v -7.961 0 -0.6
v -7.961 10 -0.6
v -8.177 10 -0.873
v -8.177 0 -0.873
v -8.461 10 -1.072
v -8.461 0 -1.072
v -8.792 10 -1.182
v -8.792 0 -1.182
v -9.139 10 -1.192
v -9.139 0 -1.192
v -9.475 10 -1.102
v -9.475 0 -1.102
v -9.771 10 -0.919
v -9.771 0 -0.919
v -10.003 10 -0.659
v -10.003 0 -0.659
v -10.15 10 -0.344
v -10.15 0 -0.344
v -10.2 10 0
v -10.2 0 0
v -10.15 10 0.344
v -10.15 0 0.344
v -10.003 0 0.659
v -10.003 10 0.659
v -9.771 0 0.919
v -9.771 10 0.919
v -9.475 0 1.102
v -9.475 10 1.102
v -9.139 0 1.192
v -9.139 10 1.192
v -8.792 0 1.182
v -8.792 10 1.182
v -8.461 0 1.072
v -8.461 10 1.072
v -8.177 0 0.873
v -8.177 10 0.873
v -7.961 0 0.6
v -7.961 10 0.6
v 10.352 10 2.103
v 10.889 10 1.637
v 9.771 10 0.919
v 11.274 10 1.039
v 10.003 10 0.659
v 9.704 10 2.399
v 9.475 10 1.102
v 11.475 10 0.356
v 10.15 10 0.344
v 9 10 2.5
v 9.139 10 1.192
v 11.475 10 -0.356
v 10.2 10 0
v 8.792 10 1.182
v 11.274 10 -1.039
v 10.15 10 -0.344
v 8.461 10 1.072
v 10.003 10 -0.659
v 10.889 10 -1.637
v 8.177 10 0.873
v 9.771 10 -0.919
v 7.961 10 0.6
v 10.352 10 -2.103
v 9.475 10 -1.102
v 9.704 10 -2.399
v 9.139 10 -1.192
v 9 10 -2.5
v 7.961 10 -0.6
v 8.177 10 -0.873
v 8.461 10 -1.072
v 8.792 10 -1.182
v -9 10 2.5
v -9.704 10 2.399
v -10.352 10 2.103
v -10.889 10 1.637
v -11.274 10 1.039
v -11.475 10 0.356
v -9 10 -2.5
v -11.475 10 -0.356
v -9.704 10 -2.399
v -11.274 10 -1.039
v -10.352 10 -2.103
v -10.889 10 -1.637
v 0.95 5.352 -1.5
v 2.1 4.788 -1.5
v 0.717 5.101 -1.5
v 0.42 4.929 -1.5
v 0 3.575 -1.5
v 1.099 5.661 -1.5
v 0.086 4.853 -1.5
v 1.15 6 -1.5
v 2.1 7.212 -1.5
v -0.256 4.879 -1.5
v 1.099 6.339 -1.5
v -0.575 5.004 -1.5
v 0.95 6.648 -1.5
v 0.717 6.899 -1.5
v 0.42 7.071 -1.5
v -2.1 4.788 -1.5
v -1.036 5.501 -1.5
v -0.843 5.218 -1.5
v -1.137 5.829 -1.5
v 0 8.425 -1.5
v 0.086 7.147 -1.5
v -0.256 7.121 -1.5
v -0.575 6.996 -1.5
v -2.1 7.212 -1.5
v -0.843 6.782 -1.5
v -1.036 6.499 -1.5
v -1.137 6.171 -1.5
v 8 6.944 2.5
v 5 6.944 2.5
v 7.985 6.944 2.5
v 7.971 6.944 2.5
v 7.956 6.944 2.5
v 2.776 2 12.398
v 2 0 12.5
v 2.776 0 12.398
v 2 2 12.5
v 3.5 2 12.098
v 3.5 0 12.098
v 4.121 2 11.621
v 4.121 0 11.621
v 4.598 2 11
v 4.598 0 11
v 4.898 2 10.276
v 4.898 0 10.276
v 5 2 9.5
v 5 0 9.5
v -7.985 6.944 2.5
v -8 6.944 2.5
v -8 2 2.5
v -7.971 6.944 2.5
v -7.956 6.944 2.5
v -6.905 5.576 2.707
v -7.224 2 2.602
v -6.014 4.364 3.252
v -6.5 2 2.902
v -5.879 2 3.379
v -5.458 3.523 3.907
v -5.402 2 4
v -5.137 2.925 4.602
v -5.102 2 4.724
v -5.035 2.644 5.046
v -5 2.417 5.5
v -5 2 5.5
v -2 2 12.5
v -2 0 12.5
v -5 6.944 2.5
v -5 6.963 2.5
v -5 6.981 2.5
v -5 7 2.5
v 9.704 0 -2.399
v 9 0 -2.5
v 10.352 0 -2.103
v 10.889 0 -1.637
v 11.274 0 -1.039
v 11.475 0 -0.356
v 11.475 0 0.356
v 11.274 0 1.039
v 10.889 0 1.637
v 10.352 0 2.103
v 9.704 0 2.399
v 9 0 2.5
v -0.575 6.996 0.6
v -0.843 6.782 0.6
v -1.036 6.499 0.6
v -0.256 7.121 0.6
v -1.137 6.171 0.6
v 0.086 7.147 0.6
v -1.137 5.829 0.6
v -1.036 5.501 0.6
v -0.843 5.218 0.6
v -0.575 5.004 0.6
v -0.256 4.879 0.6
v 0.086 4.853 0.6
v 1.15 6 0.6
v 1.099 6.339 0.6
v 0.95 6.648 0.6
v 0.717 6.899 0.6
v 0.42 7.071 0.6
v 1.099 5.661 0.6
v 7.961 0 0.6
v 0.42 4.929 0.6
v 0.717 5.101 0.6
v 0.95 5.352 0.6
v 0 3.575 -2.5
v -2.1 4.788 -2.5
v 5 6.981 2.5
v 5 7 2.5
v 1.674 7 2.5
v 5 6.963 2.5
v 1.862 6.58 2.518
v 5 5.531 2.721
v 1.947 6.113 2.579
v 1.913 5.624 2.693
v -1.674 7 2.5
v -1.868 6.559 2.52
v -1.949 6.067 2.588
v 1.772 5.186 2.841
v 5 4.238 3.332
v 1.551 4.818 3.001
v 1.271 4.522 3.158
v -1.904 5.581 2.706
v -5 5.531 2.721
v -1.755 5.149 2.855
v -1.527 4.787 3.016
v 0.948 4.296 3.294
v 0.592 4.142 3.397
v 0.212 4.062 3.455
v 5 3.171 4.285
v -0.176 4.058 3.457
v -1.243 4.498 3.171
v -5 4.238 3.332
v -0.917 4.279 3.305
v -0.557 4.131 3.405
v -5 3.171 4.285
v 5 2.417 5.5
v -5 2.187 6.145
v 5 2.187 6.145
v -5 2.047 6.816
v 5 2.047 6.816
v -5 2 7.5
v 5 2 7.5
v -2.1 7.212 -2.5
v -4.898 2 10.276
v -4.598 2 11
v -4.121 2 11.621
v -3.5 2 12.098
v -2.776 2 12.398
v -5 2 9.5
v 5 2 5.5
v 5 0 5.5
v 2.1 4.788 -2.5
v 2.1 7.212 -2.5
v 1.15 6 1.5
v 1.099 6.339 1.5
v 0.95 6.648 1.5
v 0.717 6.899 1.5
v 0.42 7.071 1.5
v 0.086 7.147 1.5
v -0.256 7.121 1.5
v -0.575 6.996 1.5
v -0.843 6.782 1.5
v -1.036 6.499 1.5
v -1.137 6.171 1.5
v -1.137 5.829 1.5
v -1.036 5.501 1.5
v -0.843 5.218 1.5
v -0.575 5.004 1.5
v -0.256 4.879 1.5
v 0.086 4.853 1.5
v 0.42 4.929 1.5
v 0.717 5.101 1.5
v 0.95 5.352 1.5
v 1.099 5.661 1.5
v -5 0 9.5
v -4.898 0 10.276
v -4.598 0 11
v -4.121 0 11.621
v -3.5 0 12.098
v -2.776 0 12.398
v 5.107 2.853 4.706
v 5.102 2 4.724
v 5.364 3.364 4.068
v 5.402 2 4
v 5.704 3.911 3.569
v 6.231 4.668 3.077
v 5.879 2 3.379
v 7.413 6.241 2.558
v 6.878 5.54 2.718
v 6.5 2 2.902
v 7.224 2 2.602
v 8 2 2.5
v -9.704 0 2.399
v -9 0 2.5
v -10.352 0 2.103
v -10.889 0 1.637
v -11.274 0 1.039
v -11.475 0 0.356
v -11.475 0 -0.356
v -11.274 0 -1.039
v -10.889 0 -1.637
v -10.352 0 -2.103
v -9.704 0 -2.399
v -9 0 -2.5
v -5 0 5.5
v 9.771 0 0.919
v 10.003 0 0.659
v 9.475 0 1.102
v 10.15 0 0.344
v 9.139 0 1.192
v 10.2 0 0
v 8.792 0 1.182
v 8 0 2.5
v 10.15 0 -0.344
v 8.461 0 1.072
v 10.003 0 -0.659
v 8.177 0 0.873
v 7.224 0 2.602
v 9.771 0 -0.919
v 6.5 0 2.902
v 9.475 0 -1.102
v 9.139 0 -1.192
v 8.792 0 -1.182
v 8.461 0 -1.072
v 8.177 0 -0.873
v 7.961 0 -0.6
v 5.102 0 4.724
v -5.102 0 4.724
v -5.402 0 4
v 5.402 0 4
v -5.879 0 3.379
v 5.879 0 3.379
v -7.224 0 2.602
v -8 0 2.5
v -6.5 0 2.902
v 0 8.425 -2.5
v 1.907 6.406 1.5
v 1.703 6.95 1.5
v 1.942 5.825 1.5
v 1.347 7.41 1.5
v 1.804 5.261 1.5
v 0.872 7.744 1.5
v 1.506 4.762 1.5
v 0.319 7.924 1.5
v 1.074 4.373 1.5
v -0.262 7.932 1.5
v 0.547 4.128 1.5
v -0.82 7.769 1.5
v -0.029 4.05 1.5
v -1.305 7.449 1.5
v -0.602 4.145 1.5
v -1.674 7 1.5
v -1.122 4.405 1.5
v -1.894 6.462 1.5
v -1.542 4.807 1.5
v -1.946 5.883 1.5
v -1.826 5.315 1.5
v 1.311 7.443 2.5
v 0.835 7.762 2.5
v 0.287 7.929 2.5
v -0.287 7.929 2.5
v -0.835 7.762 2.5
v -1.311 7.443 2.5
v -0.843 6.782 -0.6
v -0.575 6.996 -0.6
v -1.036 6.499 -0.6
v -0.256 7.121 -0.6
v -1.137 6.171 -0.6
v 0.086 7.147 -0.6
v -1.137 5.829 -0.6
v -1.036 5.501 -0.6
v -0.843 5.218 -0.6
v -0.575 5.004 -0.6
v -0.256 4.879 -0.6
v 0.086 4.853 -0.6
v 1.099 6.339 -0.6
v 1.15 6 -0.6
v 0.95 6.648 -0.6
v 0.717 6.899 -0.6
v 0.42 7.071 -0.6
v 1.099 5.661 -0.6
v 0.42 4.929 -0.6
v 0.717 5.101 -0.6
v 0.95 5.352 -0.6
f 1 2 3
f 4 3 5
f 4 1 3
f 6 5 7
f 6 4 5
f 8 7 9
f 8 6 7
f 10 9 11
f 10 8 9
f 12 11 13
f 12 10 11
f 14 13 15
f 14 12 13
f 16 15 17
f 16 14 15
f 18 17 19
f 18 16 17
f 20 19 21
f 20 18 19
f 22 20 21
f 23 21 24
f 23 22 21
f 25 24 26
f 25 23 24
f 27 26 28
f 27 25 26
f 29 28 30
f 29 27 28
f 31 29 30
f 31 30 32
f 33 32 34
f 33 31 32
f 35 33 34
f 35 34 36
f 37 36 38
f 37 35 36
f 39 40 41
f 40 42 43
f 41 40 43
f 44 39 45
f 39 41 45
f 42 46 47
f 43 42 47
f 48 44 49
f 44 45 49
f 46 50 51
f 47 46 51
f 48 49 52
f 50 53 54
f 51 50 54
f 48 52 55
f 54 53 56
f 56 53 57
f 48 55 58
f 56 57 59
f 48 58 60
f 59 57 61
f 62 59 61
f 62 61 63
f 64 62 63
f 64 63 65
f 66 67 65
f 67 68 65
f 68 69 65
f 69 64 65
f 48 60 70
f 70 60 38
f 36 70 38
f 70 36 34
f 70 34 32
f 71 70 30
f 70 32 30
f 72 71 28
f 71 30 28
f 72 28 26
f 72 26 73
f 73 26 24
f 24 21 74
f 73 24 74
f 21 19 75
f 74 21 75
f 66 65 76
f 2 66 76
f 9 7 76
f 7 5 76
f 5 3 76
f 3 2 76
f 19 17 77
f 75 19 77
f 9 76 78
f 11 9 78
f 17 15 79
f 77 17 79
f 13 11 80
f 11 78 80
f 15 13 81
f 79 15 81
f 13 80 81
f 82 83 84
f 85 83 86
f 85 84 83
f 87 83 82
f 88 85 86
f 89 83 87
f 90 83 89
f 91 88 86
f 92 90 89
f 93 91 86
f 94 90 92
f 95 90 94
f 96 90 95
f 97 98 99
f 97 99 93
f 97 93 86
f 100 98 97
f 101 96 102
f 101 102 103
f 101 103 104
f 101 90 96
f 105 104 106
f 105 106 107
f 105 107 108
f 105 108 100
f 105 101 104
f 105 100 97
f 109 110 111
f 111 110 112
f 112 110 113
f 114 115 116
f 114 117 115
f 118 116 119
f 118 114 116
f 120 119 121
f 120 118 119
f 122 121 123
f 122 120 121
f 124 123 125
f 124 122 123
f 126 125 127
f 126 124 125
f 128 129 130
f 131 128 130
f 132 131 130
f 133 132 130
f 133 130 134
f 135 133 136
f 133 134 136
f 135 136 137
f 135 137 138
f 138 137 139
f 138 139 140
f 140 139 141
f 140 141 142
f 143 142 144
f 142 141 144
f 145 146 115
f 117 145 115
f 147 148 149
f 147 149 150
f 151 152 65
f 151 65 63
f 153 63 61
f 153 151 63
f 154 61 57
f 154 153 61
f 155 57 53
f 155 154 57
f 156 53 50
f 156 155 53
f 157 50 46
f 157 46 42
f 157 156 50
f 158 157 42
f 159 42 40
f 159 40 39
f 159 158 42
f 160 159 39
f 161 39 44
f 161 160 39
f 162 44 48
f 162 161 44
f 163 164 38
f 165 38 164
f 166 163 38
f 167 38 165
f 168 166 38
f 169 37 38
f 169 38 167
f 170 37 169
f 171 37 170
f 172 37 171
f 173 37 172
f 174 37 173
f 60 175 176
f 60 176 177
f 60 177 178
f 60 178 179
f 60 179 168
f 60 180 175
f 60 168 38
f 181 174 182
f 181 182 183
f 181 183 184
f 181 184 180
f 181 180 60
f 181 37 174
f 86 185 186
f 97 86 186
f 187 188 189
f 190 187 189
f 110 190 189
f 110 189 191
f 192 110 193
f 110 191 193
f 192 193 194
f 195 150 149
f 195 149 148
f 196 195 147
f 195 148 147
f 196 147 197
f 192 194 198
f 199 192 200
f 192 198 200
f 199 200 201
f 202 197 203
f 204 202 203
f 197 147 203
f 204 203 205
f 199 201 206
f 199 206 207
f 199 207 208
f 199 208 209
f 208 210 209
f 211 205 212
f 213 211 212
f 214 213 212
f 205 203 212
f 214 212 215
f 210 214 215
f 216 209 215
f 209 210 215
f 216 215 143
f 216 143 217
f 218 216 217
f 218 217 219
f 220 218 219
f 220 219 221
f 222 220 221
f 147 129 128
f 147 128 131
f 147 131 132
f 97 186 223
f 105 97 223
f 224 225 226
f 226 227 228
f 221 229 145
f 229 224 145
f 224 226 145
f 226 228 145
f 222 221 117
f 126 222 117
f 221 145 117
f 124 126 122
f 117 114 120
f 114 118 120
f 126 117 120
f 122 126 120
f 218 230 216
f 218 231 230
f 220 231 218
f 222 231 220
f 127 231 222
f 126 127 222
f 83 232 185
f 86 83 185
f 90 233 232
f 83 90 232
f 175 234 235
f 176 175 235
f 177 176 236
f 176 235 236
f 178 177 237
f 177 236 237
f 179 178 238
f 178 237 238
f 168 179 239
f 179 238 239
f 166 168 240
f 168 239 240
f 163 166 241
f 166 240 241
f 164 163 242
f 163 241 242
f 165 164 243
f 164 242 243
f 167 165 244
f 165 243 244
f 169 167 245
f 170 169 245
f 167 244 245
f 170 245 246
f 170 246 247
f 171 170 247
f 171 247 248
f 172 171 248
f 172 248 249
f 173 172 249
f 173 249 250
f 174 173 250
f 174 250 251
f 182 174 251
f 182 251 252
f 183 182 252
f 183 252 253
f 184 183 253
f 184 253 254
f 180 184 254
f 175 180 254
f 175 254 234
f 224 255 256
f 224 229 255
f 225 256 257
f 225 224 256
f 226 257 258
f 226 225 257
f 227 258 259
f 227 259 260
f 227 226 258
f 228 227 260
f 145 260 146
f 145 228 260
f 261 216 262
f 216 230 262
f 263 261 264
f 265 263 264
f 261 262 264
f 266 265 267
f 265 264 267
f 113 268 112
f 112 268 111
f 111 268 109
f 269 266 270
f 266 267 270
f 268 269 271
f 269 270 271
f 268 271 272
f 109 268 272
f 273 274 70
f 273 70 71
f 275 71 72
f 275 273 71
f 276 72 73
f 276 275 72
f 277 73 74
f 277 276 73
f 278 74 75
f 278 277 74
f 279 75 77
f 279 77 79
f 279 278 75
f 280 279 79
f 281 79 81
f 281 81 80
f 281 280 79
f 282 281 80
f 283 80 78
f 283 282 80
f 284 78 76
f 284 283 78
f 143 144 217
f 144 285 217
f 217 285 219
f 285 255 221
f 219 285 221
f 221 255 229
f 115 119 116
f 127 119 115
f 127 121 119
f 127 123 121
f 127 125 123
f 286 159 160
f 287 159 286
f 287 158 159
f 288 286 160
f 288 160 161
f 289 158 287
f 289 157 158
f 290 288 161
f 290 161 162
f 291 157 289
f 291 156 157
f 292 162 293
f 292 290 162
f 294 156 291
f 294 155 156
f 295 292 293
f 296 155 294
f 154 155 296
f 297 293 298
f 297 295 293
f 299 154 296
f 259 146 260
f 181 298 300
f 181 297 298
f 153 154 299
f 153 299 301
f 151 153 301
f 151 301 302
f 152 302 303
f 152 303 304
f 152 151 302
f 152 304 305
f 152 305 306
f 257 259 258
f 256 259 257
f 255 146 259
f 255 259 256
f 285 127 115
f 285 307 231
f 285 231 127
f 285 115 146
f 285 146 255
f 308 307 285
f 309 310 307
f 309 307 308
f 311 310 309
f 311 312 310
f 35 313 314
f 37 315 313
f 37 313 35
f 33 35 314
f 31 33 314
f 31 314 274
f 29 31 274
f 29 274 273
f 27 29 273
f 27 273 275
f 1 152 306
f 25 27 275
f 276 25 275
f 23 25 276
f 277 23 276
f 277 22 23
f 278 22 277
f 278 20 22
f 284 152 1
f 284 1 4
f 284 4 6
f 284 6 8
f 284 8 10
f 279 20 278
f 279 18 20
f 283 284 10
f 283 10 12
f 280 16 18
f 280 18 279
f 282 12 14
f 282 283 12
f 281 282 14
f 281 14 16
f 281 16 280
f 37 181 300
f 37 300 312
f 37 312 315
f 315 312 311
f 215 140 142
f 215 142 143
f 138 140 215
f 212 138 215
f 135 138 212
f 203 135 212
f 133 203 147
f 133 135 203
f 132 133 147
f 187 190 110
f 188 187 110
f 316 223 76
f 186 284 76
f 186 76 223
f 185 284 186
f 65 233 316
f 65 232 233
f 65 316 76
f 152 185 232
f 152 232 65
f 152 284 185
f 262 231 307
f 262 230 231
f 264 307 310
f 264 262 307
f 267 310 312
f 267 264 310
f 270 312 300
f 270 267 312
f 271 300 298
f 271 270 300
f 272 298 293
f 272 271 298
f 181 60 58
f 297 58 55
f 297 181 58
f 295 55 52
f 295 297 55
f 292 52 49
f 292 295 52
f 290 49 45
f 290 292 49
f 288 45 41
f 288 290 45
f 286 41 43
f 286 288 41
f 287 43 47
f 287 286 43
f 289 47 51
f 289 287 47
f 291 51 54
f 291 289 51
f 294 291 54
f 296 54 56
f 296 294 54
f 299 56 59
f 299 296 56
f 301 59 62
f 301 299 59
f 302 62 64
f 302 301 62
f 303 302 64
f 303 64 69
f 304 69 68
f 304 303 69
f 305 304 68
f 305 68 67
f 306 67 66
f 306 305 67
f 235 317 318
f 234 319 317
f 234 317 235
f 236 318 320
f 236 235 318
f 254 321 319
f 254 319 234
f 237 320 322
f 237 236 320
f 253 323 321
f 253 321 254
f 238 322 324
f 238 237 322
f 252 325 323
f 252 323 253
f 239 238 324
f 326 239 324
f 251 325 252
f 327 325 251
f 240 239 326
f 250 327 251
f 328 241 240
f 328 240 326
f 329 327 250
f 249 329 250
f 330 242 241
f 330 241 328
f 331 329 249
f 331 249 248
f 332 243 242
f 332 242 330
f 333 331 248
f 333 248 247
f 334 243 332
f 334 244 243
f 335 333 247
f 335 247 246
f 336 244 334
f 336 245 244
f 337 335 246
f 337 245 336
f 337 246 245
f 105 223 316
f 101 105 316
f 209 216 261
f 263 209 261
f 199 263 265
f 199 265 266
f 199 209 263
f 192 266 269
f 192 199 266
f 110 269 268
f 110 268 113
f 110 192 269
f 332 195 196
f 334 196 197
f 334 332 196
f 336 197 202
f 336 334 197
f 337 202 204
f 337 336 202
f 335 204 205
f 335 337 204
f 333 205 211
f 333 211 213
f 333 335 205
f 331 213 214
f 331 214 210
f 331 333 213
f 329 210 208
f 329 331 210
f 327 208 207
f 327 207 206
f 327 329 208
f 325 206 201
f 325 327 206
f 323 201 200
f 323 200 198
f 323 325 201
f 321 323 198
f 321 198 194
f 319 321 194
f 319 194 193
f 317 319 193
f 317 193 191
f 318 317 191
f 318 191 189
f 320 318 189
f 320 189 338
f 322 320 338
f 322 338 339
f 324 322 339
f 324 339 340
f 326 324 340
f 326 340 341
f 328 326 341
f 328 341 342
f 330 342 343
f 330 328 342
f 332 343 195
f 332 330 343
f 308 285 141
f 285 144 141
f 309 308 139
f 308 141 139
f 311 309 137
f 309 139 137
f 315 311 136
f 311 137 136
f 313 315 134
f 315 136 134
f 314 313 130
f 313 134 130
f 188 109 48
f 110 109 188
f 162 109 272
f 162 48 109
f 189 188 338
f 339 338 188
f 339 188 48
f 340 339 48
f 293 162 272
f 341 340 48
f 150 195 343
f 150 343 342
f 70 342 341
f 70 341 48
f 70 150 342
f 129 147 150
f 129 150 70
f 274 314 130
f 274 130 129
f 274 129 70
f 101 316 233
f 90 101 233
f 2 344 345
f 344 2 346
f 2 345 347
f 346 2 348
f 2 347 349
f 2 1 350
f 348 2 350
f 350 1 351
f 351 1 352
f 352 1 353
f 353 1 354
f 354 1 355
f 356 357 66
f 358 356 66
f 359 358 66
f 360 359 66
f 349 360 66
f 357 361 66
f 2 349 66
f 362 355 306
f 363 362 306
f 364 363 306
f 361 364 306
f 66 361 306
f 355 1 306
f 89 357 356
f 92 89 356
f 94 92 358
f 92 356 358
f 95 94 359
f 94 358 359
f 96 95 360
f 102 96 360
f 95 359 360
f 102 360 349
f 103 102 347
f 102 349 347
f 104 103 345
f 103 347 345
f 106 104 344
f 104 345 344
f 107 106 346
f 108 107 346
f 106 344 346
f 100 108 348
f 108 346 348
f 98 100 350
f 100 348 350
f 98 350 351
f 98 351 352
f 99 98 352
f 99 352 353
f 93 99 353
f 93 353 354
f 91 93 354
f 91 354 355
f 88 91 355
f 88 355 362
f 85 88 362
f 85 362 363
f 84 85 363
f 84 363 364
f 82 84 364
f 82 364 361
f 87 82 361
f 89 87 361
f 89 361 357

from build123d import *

# Parameters (mm, degrees)
SKETCH_1_R               = 1.2
EXTRUDE_1_DEPTH          = 10
SKETCH_3_W               = 10
SKETCH_3_H               = 15
EXTRUDE_2_DEPTH          = 2
FILLET_2_R               = 3
FILLET_START             = -5
FILLET_3_DEPTH           = 10
FILLET_START_2           = 2
FILLET_3_2_DEPTH         = 4.9438
FILLET_START_3           = -9
FILLET_3_3_DEPTH         = 17
SKETCH_4_W               = 15.92154
SKETCH_4_H               = 1.2
CUT_EXTRUDE_2_DEPTH      = 20.710403
CUT_EXTRUDE_4_DEPTH      = 19.227726
CUT_EXTRUDE_4_DEPTH_BACK = 1
SKETCH_6_R               = 1.95
SKETCH_7_R               = 1.15
CUT_EXTRUDE_5_DEPTH      = 19.794946
CUT_EXTRUDE_6_DEPTH      = 1


with BuildPart() as part:
    # 草图1 → 凸台-拉伸1 (new body)
    with BuildSketch(Plane(origin=(0, 0, 0), x_dir=(1, 0, 0), z_dir=(0, 1, 0))):
        with BuildLine():
            Line((-9, 2.5), (9, 2.5))
            ThreePointArc((9, 2.5), (11.5, 0), (9, -2.5))
            Line((9, -2.5), (-9, -2.5))
            ThreePointArc((-9, -2.5), (-11.5, 0), (-9, 2.5))
        make_face()
        with Locations(Location((9, 0, 0), (0, 0, 270))):
            Circle(SKETCH_1_R, mode=Mode.SUBTRACT)
        with Locations(Location((-9, 0, 0), (0, 0, 90))):
            Circle(SKETCH_1_R, mode=Mode.SUBTRACT)
    extrude(amount=EXTRUDE_1_DEPTH)

    # 草图3 → 凸台-拉伸2 (add)
    with BuildSketch(Plane.XZ):
        with Locations((0, 5)):
            Rectangle(SKETCH_3_W, SKETCH_3_H)
    extrude(amount=-EXTRUDE_2_DEPTH)

    # 圆角2
    fillet_2_edges = [part.edges().sort_by_distance(p)[0] for p in [
        (5, 1, 12.5),
        (5, 1, 2.5),
        (-5, 1, 2.5),
        (-5, 1, 12.5),
    ]]
    fillet(fillet_2_edges, radius=FILLET_2_R)

    # 圆角3: read off the stored shape, not the designer's step
    # 圆角3 outline → 圆角3 (add)
    with BuildSketch(Plane.YZ.offset(FILLET_START)):
        with BuildLine():
            ThreePointArc((7, 2.5), (3.464466, 3.964466), (2, 7.5))
            Line((2, 7.5), (2, 2.5))
            Line((2, 2.5), (7, 2.5))
        make_face()
    extrude(amount=FILLET_3_DEPTH)

    # Fillet 3 2 outline → Fillet 3 2 (add)
    with BuildSketch(Plane(origin=(0, 0, 0), x_dir=(1, 0, 0), z_dir=(0, 1, 0)).offset(FILLET_START_2)):
        with BuildLine():
            Line((5, -2.5), (5, -5.5))
            ThreePointArc((5, -5.5), (5.87868, -3.37868), (8, -2.5))
            Line((8, -2.5), (5, -2.5))
        make_face()
        with BuildLine():
            Line((-5, -5.5), (-5, -2.5))
            Line((-5, -2.5), (-8, -2.5))
            ThreePointArc((-8, -2.5), (-5.87868, -3.37868), (-5, -5.5))
        make_face()
    extrude(amount=FILLET_3_2_DEPTH)

    # Fillet 3 3 outline → Fillet 3 3 (cut)
    with BuildSketch(Plane.YZ.offset(FILLET_START_3)):
        with BuildLine():
            Line((8, 7), (2.025063, 7))
            ThreePointArc((2.025063, 7), (3.625111, 3.81081), (6.9438, 2.500316))
            ThreePointArc((6.9438, 2.500316), (6.9719, 2.500079), (7, 2.5))
            Line((7, 2.5), (8, 2.5))
            Line((8, 2.5), (8, 7))
        make_face()
    extrude(amount=FILLET_3_3_DEPTH, mode=Mode.SUBTRACT)

    # 草图4 → 切除-拉伸2 (cut, through all)
    with BuildSketch(Plane.XZ):
        Rectangle(SKETCH_4_W, SKETCH_4_H)
    extrude(amount=-CUT_EXTRUDE_2_DEPTH, mode=Mode.SUBTRACT)

    # 草图6 → 切除-拉伸4 (cut, two sides: drawn at the far end of the back side and taken through both)
    with BuildSketch(Plane.XY.offset(2.5).offset(-CUT_EXTRUDE_4_DEPTH_BACK)):
        with Locations(Location((0, 6, 0), (0, 0, 149.148114))):
            Circle(SKETCH_6_R)
    extrude(amount=CUT_EXTRUDE_4_DEPTH + CUT_EXTRUDE_4_DEPTH_BACK, mode=Mode.SUBTRACT)

    # 草图7 → 切除-拉伸5 (cut, through all)
    with BuildSketch(Plane.XY.offset(1.5)):
        with Locations((0, 6)):
            Circle(SKETCH_7_R)
    extrude(amount=-CUT_EXTRUDE_5_DEPTH, mode=Mode.SUBTRACT)

    # 草图8 → 切除-拉伸6 (cut)
    with BuildSketch(Plane(origin=(0, 0, -2.5), x_dir=(-1, 0, 0), z_dir=(0, 0, -1))):
        Polygon((0, 8.424871), (-2.1, 7.212436), (-2.1, 4.787564), (0, 3.575129), (2.1, 4.787564), (2.1, 7.212436), align=None)
    extrude(amount=-CUT_EXTRUDE_6_DEPTH, mode=Mode.SUBTRACT)


solid = part.part
